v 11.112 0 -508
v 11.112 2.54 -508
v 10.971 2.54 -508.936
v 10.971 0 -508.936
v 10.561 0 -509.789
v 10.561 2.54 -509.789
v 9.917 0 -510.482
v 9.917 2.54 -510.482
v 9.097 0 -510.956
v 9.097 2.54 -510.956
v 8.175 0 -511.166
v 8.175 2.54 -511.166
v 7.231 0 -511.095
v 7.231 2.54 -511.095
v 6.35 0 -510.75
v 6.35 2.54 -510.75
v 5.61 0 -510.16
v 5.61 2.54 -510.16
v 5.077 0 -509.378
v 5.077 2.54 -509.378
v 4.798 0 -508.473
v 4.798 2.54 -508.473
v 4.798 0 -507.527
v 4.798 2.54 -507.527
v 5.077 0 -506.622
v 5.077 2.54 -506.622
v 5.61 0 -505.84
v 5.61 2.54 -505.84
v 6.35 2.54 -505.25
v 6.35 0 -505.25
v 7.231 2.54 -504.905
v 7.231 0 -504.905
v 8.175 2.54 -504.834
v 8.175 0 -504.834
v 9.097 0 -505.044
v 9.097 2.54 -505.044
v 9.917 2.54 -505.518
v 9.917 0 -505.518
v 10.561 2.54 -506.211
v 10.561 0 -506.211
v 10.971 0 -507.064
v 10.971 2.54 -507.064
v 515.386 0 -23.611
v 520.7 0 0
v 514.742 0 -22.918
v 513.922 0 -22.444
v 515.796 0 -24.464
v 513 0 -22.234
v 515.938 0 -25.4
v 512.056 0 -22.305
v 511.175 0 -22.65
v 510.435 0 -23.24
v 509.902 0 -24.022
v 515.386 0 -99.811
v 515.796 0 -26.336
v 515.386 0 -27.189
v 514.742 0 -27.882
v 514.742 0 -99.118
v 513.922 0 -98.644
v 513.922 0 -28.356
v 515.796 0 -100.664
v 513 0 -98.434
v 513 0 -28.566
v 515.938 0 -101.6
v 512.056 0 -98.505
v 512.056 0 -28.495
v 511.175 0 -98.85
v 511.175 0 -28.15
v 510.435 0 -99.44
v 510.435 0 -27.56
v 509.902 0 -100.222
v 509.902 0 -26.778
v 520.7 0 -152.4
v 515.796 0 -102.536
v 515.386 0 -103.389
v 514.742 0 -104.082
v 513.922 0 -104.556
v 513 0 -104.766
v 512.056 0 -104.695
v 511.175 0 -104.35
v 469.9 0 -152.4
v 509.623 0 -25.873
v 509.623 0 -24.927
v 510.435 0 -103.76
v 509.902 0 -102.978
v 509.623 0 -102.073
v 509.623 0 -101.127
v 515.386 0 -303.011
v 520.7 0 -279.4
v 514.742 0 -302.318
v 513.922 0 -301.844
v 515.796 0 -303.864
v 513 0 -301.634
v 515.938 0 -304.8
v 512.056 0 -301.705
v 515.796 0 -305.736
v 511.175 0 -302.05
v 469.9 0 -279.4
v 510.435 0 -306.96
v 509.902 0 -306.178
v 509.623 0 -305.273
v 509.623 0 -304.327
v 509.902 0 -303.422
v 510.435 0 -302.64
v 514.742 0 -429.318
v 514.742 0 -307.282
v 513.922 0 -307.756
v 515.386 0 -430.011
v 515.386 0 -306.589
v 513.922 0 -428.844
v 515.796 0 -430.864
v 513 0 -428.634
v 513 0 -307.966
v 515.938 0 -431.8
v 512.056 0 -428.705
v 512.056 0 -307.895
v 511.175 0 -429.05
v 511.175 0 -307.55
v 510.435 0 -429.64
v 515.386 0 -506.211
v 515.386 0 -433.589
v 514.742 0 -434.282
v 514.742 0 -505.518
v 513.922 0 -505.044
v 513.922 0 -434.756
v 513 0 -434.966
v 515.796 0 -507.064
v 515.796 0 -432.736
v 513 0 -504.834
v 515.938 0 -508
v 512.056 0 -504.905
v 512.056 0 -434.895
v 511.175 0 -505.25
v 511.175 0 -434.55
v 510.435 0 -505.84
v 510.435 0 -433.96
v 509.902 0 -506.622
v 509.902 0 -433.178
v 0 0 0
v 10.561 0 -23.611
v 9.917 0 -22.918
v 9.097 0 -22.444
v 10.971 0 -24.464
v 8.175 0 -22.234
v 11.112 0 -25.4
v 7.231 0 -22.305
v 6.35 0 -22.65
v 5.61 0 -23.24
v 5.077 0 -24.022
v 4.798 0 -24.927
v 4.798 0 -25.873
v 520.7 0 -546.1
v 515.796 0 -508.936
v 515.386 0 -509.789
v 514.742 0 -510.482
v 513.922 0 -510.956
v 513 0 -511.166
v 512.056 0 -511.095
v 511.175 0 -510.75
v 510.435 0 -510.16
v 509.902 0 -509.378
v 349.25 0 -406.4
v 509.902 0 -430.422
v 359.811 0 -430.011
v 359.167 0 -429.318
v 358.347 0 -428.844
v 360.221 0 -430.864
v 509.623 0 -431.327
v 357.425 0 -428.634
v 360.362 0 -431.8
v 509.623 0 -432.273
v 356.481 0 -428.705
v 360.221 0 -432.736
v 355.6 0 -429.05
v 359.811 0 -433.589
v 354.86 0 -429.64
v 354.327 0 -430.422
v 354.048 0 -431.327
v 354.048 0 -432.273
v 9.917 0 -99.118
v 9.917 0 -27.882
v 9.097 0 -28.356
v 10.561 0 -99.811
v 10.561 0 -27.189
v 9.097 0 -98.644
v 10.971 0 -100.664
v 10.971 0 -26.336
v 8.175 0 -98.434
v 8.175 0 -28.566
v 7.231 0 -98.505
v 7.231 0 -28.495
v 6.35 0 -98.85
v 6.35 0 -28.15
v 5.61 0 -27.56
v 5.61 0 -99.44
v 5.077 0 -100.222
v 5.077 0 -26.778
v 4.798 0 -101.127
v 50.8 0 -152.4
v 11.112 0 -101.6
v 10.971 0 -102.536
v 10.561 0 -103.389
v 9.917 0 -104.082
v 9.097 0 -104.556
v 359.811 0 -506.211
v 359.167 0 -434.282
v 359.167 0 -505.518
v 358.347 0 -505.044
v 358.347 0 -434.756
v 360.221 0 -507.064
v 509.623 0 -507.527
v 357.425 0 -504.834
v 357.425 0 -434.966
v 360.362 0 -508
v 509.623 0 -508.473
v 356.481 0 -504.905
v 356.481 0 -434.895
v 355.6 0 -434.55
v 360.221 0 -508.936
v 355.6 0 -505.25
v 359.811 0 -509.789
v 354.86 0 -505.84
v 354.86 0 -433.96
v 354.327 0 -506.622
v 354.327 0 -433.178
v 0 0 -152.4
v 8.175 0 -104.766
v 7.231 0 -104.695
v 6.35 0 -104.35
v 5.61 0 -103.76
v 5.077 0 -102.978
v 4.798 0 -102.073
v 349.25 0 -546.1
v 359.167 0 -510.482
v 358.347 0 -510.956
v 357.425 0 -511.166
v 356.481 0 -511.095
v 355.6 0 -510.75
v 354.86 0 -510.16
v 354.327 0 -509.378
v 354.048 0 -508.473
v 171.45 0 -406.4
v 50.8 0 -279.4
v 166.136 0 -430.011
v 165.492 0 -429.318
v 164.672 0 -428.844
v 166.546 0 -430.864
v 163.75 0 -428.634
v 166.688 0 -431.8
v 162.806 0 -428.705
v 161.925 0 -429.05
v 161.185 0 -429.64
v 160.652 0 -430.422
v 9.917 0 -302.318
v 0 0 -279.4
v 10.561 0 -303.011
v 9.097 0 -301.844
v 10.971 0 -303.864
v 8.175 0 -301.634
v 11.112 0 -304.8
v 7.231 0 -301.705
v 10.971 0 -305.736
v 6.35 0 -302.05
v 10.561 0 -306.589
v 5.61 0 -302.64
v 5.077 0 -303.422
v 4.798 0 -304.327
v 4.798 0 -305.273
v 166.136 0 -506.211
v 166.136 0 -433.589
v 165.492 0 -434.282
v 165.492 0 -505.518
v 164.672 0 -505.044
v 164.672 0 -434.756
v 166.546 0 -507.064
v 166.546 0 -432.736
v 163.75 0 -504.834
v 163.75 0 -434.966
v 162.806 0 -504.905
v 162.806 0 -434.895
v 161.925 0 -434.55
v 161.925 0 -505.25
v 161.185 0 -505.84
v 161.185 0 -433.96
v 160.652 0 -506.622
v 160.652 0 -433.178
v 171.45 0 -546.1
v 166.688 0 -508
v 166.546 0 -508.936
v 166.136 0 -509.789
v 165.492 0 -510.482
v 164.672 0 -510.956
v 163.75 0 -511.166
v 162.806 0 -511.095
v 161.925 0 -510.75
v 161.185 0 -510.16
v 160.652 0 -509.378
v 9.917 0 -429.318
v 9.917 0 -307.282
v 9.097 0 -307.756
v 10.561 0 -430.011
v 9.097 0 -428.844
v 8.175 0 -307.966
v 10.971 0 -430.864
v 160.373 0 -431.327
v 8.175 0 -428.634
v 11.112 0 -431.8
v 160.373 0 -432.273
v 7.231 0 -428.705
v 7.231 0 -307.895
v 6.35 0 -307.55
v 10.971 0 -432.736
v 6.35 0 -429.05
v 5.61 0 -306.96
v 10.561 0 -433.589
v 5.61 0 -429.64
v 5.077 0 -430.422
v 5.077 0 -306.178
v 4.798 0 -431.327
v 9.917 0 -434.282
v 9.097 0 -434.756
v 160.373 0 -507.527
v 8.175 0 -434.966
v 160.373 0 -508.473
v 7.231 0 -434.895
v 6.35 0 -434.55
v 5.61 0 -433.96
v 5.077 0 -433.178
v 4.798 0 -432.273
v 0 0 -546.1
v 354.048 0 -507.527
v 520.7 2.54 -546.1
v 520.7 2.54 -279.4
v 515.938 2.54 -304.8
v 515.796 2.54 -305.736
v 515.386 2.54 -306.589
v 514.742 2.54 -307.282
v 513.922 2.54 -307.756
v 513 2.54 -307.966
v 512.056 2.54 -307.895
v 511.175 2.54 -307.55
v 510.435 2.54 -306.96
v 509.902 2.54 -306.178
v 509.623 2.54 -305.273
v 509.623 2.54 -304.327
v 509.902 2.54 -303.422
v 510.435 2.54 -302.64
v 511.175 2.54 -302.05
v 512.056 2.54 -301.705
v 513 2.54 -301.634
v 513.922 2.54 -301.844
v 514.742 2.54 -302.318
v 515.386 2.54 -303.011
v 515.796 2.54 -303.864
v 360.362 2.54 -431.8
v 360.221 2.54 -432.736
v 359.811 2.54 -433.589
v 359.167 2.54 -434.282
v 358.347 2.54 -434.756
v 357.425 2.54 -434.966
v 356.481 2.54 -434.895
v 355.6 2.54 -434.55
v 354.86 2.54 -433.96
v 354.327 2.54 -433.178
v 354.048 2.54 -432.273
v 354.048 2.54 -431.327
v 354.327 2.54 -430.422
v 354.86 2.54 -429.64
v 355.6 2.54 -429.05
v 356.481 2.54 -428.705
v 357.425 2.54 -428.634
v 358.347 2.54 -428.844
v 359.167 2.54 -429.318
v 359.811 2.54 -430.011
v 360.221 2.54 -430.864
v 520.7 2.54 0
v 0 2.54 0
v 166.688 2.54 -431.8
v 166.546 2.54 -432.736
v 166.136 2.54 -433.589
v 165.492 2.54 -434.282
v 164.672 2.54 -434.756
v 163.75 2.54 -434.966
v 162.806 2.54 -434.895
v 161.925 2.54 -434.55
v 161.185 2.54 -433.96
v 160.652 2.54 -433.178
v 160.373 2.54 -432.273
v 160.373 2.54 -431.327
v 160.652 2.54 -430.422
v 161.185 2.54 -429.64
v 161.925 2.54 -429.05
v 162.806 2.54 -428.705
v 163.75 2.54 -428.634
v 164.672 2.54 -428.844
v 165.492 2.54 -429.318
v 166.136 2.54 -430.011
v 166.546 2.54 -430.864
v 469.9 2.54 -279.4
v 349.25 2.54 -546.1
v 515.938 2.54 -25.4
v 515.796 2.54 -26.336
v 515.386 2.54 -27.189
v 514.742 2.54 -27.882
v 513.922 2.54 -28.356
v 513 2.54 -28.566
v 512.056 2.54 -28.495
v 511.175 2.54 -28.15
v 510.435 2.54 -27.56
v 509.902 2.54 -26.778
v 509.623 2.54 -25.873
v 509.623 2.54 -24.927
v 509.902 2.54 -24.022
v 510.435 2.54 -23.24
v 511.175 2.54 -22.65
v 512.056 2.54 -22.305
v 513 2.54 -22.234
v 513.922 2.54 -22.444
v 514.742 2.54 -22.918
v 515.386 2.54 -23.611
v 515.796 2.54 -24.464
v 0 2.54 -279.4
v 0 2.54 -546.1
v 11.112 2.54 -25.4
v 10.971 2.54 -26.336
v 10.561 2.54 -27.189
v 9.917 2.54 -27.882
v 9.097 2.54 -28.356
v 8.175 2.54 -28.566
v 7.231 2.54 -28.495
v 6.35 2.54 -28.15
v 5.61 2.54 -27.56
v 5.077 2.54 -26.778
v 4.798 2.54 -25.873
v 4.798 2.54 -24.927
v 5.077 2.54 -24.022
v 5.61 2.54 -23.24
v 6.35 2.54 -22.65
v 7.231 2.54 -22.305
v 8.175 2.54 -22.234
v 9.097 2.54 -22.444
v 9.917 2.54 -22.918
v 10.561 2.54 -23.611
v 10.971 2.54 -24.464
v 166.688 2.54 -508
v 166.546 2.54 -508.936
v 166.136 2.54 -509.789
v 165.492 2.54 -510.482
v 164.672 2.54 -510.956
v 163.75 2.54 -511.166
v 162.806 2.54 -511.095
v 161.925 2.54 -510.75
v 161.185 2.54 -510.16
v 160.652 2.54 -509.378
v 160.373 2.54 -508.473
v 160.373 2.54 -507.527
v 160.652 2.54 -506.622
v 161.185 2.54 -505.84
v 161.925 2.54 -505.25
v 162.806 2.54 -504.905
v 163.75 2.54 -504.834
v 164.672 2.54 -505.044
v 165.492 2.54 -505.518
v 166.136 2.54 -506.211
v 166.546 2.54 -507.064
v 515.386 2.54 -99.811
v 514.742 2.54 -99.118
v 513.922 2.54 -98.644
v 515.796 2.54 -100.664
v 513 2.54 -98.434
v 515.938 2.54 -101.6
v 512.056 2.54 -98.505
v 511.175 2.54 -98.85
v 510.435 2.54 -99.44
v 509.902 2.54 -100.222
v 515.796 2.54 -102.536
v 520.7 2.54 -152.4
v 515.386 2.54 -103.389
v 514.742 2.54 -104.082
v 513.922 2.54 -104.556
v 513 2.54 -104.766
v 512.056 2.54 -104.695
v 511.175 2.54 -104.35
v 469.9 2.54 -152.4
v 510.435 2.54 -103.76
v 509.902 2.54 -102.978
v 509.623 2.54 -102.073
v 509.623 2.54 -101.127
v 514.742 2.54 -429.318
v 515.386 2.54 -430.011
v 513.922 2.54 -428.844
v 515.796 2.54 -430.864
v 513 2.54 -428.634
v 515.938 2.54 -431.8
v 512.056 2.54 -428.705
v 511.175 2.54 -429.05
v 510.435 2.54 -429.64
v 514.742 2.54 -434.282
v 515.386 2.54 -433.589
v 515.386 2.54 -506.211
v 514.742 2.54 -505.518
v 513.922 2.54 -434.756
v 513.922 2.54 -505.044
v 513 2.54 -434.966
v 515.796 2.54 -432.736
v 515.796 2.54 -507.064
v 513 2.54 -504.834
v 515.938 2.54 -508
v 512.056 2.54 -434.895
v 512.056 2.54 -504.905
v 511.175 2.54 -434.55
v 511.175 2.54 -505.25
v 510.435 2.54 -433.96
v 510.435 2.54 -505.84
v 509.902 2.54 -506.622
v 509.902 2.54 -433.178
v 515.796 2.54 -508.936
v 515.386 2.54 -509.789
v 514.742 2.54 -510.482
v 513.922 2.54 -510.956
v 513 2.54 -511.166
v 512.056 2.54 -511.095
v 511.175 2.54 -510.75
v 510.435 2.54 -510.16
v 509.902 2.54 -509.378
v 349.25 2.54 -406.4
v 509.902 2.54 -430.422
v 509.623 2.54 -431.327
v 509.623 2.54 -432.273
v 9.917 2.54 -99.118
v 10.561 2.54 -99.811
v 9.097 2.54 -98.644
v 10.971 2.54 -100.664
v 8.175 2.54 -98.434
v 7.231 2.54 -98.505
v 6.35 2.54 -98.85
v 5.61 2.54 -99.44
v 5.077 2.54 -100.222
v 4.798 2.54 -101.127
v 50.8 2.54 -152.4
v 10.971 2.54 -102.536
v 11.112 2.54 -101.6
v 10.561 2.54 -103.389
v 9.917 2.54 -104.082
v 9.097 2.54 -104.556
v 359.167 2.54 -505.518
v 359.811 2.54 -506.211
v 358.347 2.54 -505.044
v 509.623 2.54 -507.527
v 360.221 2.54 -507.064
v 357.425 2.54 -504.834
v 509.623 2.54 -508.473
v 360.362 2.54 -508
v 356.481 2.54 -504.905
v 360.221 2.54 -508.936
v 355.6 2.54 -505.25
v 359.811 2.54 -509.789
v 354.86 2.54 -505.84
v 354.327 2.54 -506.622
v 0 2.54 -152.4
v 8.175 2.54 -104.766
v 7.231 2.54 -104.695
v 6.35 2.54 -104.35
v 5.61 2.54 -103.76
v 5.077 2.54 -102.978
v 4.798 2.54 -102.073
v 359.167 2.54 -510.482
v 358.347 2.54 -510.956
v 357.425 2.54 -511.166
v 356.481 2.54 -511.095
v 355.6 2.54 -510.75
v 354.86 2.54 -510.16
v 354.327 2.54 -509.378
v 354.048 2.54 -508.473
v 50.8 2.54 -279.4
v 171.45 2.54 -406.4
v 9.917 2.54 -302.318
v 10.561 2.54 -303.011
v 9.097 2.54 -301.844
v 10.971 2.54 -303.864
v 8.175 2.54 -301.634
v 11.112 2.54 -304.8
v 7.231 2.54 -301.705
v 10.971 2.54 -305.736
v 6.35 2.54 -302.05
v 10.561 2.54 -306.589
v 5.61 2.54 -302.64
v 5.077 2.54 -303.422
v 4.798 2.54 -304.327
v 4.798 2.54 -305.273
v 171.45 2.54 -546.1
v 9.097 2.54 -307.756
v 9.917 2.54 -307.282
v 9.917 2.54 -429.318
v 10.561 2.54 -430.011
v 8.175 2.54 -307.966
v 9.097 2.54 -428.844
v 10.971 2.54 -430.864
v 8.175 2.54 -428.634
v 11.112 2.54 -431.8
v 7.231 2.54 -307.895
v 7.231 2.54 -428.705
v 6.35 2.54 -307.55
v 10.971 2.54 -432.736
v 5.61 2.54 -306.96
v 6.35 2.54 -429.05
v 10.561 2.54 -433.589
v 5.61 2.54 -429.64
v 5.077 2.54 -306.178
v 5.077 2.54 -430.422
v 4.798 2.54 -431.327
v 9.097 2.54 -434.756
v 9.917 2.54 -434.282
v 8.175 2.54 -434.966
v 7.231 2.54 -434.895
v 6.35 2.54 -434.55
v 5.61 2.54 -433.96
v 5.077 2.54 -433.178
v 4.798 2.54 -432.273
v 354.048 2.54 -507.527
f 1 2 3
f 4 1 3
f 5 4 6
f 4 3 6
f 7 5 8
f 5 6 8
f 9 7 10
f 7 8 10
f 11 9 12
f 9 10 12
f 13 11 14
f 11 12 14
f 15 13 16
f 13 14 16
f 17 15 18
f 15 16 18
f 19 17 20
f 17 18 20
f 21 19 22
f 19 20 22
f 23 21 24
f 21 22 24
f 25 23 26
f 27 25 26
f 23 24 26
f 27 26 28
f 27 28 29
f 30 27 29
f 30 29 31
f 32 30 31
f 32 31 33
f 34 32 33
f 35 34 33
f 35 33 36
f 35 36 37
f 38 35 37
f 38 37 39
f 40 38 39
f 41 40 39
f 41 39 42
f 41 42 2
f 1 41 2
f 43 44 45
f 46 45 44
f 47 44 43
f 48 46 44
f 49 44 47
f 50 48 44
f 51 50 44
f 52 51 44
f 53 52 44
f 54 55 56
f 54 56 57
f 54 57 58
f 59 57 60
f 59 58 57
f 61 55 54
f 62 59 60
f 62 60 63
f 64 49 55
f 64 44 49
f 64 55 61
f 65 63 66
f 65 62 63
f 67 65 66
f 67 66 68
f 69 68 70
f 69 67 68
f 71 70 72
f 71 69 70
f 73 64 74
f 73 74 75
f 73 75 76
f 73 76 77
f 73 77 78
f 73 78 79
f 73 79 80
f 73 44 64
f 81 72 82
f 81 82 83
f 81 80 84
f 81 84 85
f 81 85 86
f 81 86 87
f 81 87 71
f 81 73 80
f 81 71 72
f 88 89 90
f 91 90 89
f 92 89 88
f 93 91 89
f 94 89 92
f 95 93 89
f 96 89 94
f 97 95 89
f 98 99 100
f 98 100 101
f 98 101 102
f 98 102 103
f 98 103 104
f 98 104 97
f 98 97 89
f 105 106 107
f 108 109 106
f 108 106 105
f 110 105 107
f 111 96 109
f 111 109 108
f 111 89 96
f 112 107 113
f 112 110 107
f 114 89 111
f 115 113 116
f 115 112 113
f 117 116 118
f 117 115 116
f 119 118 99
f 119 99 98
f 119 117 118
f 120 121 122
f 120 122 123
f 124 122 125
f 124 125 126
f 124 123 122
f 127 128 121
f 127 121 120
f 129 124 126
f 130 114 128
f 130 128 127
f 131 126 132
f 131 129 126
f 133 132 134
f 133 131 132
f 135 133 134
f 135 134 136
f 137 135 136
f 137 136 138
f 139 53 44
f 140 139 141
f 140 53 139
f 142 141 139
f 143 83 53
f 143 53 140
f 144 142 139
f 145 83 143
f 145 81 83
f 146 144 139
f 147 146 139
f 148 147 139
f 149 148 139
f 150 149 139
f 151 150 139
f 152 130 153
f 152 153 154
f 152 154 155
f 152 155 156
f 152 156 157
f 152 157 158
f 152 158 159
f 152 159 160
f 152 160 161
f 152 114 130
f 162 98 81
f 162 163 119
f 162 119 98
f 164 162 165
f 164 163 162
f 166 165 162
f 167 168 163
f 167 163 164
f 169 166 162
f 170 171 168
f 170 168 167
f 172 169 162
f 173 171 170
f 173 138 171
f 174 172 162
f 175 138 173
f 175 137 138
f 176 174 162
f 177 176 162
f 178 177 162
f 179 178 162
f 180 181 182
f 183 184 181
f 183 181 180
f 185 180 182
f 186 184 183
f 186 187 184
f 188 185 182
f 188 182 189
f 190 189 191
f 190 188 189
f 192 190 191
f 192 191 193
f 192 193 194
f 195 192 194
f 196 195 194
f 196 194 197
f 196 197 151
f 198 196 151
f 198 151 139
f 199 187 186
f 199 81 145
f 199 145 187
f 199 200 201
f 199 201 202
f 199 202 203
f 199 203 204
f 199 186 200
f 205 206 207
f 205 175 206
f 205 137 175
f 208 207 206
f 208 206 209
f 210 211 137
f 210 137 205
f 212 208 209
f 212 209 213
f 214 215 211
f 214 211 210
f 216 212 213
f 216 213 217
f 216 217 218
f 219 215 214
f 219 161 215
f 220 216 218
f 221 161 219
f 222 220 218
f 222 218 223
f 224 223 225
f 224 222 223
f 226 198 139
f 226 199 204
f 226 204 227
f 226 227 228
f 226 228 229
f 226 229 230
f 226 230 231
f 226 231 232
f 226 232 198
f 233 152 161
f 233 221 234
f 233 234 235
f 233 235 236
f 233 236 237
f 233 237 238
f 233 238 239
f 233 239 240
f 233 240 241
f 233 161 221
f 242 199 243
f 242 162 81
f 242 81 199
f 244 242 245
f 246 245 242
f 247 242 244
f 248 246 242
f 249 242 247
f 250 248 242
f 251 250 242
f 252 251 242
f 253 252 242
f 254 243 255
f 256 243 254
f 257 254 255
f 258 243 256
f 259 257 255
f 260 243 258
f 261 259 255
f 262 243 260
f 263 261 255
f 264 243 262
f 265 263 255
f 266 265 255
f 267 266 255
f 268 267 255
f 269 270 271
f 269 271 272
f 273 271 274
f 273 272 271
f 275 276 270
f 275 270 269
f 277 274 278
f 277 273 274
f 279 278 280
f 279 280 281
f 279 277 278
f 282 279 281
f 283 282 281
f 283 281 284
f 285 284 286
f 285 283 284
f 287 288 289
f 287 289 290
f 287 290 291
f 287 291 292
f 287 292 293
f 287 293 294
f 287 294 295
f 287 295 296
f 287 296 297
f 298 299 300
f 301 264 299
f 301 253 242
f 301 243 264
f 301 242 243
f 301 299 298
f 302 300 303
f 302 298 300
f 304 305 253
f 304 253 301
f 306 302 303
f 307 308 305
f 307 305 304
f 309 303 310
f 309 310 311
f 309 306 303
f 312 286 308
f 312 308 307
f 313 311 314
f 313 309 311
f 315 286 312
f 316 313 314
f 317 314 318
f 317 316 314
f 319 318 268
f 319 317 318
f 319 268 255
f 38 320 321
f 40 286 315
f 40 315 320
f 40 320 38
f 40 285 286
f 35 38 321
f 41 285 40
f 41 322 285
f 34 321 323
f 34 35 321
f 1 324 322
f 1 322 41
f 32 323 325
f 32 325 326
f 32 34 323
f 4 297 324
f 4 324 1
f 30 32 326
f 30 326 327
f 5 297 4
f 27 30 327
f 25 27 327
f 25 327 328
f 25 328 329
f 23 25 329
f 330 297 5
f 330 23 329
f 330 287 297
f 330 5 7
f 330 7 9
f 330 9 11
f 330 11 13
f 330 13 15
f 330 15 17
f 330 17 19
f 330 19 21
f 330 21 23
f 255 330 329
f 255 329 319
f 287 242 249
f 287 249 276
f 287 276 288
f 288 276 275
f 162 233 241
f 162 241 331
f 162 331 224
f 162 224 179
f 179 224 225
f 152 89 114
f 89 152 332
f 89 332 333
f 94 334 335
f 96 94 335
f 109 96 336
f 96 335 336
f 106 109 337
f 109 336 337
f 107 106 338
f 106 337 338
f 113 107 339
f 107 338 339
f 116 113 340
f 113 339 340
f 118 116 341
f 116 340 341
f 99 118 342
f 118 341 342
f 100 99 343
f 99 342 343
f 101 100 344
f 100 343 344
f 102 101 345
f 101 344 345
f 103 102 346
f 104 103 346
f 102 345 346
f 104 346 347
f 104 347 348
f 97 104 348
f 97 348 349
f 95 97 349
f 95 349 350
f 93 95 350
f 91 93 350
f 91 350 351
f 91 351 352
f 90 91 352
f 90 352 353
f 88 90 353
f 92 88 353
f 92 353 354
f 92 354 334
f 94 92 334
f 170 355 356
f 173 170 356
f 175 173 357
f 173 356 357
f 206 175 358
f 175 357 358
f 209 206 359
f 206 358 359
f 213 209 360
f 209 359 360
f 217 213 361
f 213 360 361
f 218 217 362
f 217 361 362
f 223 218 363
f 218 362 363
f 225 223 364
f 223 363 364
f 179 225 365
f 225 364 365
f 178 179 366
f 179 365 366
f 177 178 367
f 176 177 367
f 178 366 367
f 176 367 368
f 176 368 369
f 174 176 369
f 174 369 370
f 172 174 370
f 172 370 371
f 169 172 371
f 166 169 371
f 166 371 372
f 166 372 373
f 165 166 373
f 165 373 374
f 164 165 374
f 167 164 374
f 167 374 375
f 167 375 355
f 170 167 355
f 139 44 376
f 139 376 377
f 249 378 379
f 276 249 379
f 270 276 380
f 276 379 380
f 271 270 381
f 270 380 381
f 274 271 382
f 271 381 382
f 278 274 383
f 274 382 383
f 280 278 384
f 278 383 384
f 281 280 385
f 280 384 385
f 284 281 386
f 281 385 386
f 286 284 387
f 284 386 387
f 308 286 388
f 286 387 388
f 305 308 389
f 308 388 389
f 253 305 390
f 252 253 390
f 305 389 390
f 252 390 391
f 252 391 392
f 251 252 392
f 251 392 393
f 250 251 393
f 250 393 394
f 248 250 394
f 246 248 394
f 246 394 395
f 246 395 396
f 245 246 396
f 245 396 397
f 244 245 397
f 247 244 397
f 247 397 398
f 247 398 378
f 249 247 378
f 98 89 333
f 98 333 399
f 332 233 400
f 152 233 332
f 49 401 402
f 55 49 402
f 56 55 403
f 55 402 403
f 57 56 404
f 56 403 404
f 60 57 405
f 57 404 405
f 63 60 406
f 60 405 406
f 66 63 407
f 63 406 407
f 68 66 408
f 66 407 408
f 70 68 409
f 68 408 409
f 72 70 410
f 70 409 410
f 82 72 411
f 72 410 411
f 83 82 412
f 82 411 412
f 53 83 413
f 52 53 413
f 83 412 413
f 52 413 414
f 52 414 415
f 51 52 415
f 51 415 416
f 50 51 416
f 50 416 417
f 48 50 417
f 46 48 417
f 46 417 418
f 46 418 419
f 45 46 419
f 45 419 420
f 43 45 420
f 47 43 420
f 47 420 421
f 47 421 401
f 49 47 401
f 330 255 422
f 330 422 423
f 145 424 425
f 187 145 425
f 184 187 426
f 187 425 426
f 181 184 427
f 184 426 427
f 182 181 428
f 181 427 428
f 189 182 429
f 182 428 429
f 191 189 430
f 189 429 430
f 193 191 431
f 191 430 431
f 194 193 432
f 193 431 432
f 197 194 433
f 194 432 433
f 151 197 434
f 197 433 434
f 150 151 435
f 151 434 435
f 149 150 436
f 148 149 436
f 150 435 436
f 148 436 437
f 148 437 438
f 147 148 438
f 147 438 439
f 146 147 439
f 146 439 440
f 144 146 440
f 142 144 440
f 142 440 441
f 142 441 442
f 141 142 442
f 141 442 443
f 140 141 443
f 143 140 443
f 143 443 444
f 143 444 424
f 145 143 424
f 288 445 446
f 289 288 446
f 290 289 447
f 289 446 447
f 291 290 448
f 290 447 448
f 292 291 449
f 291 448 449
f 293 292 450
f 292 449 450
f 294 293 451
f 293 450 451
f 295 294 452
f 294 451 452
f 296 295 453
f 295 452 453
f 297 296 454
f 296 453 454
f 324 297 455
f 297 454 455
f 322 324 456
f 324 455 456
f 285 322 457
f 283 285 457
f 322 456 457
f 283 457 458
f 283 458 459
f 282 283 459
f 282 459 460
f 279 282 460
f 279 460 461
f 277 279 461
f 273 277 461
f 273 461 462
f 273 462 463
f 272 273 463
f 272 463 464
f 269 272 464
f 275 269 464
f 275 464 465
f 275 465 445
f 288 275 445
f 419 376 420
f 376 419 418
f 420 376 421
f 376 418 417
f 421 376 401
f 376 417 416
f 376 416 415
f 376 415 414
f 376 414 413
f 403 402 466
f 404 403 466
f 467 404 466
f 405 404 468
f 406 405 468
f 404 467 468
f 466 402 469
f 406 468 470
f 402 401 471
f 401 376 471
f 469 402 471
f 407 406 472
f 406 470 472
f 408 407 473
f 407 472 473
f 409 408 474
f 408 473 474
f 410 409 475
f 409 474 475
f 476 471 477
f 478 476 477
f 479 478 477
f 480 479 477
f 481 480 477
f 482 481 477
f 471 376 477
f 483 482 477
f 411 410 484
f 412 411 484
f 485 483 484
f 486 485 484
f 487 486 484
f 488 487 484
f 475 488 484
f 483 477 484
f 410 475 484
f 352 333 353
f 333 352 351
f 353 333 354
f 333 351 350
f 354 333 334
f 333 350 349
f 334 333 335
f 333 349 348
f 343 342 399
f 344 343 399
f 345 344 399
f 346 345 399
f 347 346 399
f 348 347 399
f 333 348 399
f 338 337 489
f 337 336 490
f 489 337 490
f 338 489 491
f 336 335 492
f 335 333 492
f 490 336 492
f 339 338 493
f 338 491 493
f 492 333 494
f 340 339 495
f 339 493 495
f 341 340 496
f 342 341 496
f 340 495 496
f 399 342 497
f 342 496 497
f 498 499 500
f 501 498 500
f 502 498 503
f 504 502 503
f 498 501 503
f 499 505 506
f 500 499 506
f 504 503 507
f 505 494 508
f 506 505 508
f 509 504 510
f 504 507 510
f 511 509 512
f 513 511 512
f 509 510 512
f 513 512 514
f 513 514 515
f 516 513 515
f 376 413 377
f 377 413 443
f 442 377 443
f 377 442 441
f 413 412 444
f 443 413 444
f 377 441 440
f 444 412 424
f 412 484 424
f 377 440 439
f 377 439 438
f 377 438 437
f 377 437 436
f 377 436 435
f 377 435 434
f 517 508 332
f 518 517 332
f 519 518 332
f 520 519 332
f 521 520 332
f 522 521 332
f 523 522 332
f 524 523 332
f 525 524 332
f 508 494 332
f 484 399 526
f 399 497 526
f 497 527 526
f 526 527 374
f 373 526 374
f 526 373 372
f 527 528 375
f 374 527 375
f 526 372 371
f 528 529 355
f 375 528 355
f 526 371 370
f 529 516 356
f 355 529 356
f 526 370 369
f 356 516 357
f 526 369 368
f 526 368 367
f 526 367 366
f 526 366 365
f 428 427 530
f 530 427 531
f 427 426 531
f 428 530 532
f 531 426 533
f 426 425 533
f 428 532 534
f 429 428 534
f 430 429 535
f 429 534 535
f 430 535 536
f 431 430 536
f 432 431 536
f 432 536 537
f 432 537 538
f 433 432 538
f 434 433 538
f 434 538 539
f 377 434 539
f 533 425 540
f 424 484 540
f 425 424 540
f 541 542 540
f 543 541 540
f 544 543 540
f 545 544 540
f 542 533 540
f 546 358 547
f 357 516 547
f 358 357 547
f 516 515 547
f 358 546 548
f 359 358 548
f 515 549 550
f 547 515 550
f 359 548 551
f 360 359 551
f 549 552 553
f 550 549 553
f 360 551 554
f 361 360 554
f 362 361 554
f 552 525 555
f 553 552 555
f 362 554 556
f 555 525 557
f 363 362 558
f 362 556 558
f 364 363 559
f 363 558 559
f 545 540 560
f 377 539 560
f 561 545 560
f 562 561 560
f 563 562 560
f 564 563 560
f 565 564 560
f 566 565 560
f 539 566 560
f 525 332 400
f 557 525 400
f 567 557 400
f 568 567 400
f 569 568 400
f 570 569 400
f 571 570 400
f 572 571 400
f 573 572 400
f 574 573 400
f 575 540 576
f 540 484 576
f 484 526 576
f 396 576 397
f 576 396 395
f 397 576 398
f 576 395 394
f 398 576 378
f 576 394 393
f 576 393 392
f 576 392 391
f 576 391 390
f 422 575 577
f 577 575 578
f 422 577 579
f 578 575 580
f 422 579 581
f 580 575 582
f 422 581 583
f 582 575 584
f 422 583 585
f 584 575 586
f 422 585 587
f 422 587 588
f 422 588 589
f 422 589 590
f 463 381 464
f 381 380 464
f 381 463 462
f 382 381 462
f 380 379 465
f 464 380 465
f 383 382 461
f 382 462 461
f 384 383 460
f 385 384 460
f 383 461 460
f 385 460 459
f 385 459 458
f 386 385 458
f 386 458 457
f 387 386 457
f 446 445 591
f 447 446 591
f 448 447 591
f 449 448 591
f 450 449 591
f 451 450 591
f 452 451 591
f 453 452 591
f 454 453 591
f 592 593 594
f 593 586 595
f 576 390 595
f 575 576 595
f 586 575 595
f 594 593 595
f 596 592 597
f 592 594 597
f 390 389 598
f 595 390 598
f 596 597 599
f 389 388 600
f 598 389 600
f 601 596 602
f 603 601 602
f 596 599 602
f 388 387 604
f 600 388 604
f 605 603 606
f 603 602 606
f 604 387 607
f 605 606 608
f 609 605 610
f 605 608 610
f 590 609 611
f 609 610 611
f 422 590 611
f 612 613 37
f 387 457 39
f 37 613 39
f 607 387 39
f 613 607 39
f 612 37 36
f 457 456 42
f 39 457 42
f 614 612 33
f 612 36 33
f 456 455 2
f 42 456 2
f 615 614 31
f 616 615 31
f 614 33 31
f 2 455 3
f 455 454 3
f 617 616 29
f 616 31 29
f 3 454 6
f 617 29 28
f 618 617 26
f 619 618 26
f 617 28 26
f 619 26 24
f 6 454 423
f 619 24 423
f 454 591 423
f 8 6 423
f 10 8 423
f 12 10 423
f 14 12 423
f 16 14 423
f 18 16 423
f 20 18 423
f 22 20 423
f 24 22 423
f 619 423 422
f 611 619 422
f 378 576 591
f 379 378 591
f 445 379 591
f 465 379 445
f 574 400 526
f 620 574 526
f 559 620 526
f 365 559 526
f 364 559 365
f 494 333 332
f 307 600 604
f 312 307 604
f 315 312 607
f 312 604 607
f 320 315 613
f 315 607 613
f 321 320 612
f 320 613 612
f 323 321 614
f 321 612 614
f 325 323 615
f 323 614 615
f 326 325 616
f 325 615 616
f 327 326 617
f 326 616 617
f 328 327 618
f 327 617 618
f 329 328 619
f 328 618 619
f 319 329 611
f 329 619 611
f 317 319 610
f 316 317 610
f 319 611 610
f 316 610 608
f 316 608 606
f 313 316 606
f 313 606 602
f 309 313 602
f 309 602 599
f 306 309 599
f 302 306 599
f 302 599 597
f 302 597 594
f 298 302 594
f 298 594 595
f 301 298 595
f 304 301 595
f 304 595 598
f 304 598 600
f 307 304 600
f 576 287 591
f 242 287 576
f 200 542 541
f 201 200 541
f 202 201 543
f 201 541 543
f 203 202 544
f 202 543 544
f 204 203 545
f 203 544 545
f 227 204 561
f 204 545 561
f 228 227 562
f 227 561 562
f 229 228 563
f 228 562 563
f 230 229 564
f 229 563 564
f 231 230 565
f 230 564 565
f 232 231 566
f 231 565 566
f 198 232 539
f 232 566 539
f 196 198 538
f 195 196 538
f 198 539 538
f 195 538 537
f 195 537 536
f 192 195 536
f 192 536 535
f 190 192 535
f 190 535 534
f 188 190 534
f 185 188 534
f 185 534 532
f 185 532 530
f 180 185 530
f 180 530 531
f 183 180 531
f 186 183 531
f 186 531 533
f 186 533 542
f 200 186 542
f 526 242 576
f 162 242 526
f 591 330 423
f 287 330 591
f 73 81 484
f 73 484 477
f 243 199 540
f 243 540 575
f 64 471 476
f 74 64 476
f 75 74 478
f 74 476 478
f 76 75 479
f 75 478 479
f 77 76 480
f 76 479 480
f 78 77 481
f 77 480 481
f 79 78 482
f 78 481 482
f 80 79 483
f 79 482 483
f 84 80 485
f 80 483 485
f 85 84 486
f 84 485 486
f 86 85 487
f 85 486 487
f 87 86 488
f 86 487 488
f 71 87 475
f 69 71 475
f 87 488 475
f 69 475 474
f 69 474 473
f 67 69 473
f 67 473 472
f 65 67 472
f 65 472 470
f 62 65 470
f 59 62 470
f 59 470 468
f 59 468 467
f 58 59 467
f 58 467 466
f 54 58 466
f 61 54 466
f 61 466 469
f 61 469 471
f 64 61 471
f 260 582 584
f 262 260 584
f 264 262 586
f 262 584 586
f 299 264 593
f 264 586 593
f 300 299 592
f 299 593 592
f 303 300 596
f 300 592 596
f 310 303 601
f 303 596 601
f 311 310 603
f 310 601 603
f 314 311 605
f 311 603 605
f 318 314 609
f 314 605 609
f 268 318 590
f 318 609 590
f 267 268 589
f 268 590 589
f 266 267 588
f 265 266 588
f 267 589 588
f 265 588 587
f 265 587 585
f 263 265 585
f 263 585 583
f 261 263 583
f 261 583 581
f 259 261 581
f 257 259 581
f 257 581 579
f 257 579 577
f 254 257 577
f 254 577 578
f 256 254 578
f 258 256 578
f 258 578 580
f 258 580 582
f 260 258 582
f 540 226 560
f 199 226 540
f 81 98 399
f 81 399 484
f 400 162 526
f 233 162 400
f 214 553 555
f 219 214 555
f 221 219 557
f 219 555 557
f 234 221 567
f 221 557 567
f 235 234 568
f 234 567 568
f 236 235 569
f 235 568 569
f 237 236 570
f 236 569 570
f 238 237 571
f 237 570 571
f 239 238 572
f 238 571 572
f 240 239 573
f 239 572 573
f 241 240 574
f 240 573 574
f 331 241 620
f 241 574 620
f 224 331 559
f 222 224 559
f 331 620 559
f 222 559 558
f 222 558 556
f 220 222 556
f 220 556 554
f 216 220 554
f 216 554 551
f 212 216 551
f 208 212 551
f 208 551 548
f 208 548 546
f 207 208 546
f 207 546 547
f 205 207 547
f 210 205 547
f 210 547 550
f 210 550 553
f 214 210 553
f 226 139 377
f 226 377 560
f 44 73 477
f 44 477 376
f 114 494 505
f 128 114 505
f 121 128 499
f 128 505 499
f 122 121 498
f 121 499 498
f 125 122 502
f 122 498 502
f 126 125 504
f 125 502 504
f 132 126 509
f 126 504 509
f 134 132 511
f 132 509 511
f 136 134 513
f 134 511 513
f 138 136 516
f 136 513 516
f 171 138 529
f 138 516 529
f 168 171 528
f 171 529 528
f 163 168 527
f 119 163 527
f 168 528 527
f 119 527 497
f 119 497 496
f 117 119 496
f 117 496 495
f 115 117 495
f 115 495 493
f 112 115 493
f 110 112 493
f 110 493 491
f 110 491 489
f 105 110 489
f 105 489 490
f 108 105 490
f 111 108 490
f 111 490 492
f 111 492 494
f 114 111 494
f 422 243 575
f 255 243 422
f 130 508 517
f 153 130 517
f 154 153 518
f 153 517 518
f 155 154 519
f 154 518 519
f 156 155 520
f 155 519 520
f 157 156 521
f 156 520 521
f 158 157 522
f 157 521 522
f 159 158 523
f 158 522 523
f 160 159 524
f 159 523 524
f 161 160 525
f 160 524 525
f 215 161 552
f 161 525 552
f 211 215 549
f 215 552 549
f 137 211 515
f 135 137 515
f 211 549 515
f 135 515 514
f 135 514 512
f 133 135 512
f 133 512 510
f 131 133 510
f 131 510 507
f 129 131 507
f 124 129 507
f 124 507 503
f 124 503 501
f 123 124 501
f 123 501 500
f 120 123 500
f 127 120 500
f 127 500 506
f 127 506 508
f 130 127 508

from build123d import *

# Parameters (mm, degrees)
BOSS_EXTRUDE1_DEPTH = 2.54
SKETCH2_R           = 3.175
CUT_EXTRUDE1_DEPTH  = 3.54


with BuildPart() as part:
    # Sketch1 → Boss-Extrude1 (new body)
    with BuildSketch(Plane(origin=(0, 0, 0), x_dir=(1, 0, 0), z_dir=(0, 1, 0))):
        Polygon((0, 279.4), (0, 546.1), (171.45, 546.1), (171.45, 406.4), (349.25, 406.4), (349.25, 546.1), (520.7, 546.1), (520.7, 279.4), (469.9, 279.4), (469.9, 152.4), (520.7, 152.4), (520.7, 0), (0, 0), (0, 152.4), (50.8, 152.4), (50.8, 279.4), align=None)
    extrude(amount=BOSS_EXTRUDE1_DEPTH)

    # Sketch2 → Cut-Extrude1 (cut, through all)
    with BuildSketch(Plane(origin=(0, 2.54, 0), x_dir=(1, 0, 0), z_dir=(0, 1, 0))):
        with Locations((7.9375, 508)):
            Circle(SKETCH2_R)
        with Locations((163.5125, 508)):
            Circle(SKETCH2_R)
        with Locations((7.9375, 431.8)):
            Circle(SKETCH2_R)
        with Locations((163.5125, 431.8)):
            Circle(SKETCH2_R)
        with Locations((7.9375, 304.8)):
            Circle(SKETCH2_R)
        with Locations((7.9375, 101.6)):
            Circle(SKETCH2_R)
        with Locations((7.9375, 25.4)):
            Circle(SKETCH2_R)
        with Locations((512.7625, 25.4)):
            Circle(SKETCH2_R)
        with Locations((512.7625, 101.6)):
            Circle(SKETCH2_R)
        with Locations((512.7625, 304.8)):
            Circle(SKETCH2_R)
        with Locations((357.1875, 431.8)):
            Circle(SKETCH2_R)
        with Locations((512.7625, 431.8)):
            Circle(SKETCH2_R)
        with Locations((357.1875, 508)):
            Circle(SKETCH2_R)
        with Locations((512.7625, 508)):
            Circle(SKETCH2_R)
    extrude(amount=-CUT_EXTRUDE1_DEPTH, mode=Mode.SUBTRACT)


solid = part.part
